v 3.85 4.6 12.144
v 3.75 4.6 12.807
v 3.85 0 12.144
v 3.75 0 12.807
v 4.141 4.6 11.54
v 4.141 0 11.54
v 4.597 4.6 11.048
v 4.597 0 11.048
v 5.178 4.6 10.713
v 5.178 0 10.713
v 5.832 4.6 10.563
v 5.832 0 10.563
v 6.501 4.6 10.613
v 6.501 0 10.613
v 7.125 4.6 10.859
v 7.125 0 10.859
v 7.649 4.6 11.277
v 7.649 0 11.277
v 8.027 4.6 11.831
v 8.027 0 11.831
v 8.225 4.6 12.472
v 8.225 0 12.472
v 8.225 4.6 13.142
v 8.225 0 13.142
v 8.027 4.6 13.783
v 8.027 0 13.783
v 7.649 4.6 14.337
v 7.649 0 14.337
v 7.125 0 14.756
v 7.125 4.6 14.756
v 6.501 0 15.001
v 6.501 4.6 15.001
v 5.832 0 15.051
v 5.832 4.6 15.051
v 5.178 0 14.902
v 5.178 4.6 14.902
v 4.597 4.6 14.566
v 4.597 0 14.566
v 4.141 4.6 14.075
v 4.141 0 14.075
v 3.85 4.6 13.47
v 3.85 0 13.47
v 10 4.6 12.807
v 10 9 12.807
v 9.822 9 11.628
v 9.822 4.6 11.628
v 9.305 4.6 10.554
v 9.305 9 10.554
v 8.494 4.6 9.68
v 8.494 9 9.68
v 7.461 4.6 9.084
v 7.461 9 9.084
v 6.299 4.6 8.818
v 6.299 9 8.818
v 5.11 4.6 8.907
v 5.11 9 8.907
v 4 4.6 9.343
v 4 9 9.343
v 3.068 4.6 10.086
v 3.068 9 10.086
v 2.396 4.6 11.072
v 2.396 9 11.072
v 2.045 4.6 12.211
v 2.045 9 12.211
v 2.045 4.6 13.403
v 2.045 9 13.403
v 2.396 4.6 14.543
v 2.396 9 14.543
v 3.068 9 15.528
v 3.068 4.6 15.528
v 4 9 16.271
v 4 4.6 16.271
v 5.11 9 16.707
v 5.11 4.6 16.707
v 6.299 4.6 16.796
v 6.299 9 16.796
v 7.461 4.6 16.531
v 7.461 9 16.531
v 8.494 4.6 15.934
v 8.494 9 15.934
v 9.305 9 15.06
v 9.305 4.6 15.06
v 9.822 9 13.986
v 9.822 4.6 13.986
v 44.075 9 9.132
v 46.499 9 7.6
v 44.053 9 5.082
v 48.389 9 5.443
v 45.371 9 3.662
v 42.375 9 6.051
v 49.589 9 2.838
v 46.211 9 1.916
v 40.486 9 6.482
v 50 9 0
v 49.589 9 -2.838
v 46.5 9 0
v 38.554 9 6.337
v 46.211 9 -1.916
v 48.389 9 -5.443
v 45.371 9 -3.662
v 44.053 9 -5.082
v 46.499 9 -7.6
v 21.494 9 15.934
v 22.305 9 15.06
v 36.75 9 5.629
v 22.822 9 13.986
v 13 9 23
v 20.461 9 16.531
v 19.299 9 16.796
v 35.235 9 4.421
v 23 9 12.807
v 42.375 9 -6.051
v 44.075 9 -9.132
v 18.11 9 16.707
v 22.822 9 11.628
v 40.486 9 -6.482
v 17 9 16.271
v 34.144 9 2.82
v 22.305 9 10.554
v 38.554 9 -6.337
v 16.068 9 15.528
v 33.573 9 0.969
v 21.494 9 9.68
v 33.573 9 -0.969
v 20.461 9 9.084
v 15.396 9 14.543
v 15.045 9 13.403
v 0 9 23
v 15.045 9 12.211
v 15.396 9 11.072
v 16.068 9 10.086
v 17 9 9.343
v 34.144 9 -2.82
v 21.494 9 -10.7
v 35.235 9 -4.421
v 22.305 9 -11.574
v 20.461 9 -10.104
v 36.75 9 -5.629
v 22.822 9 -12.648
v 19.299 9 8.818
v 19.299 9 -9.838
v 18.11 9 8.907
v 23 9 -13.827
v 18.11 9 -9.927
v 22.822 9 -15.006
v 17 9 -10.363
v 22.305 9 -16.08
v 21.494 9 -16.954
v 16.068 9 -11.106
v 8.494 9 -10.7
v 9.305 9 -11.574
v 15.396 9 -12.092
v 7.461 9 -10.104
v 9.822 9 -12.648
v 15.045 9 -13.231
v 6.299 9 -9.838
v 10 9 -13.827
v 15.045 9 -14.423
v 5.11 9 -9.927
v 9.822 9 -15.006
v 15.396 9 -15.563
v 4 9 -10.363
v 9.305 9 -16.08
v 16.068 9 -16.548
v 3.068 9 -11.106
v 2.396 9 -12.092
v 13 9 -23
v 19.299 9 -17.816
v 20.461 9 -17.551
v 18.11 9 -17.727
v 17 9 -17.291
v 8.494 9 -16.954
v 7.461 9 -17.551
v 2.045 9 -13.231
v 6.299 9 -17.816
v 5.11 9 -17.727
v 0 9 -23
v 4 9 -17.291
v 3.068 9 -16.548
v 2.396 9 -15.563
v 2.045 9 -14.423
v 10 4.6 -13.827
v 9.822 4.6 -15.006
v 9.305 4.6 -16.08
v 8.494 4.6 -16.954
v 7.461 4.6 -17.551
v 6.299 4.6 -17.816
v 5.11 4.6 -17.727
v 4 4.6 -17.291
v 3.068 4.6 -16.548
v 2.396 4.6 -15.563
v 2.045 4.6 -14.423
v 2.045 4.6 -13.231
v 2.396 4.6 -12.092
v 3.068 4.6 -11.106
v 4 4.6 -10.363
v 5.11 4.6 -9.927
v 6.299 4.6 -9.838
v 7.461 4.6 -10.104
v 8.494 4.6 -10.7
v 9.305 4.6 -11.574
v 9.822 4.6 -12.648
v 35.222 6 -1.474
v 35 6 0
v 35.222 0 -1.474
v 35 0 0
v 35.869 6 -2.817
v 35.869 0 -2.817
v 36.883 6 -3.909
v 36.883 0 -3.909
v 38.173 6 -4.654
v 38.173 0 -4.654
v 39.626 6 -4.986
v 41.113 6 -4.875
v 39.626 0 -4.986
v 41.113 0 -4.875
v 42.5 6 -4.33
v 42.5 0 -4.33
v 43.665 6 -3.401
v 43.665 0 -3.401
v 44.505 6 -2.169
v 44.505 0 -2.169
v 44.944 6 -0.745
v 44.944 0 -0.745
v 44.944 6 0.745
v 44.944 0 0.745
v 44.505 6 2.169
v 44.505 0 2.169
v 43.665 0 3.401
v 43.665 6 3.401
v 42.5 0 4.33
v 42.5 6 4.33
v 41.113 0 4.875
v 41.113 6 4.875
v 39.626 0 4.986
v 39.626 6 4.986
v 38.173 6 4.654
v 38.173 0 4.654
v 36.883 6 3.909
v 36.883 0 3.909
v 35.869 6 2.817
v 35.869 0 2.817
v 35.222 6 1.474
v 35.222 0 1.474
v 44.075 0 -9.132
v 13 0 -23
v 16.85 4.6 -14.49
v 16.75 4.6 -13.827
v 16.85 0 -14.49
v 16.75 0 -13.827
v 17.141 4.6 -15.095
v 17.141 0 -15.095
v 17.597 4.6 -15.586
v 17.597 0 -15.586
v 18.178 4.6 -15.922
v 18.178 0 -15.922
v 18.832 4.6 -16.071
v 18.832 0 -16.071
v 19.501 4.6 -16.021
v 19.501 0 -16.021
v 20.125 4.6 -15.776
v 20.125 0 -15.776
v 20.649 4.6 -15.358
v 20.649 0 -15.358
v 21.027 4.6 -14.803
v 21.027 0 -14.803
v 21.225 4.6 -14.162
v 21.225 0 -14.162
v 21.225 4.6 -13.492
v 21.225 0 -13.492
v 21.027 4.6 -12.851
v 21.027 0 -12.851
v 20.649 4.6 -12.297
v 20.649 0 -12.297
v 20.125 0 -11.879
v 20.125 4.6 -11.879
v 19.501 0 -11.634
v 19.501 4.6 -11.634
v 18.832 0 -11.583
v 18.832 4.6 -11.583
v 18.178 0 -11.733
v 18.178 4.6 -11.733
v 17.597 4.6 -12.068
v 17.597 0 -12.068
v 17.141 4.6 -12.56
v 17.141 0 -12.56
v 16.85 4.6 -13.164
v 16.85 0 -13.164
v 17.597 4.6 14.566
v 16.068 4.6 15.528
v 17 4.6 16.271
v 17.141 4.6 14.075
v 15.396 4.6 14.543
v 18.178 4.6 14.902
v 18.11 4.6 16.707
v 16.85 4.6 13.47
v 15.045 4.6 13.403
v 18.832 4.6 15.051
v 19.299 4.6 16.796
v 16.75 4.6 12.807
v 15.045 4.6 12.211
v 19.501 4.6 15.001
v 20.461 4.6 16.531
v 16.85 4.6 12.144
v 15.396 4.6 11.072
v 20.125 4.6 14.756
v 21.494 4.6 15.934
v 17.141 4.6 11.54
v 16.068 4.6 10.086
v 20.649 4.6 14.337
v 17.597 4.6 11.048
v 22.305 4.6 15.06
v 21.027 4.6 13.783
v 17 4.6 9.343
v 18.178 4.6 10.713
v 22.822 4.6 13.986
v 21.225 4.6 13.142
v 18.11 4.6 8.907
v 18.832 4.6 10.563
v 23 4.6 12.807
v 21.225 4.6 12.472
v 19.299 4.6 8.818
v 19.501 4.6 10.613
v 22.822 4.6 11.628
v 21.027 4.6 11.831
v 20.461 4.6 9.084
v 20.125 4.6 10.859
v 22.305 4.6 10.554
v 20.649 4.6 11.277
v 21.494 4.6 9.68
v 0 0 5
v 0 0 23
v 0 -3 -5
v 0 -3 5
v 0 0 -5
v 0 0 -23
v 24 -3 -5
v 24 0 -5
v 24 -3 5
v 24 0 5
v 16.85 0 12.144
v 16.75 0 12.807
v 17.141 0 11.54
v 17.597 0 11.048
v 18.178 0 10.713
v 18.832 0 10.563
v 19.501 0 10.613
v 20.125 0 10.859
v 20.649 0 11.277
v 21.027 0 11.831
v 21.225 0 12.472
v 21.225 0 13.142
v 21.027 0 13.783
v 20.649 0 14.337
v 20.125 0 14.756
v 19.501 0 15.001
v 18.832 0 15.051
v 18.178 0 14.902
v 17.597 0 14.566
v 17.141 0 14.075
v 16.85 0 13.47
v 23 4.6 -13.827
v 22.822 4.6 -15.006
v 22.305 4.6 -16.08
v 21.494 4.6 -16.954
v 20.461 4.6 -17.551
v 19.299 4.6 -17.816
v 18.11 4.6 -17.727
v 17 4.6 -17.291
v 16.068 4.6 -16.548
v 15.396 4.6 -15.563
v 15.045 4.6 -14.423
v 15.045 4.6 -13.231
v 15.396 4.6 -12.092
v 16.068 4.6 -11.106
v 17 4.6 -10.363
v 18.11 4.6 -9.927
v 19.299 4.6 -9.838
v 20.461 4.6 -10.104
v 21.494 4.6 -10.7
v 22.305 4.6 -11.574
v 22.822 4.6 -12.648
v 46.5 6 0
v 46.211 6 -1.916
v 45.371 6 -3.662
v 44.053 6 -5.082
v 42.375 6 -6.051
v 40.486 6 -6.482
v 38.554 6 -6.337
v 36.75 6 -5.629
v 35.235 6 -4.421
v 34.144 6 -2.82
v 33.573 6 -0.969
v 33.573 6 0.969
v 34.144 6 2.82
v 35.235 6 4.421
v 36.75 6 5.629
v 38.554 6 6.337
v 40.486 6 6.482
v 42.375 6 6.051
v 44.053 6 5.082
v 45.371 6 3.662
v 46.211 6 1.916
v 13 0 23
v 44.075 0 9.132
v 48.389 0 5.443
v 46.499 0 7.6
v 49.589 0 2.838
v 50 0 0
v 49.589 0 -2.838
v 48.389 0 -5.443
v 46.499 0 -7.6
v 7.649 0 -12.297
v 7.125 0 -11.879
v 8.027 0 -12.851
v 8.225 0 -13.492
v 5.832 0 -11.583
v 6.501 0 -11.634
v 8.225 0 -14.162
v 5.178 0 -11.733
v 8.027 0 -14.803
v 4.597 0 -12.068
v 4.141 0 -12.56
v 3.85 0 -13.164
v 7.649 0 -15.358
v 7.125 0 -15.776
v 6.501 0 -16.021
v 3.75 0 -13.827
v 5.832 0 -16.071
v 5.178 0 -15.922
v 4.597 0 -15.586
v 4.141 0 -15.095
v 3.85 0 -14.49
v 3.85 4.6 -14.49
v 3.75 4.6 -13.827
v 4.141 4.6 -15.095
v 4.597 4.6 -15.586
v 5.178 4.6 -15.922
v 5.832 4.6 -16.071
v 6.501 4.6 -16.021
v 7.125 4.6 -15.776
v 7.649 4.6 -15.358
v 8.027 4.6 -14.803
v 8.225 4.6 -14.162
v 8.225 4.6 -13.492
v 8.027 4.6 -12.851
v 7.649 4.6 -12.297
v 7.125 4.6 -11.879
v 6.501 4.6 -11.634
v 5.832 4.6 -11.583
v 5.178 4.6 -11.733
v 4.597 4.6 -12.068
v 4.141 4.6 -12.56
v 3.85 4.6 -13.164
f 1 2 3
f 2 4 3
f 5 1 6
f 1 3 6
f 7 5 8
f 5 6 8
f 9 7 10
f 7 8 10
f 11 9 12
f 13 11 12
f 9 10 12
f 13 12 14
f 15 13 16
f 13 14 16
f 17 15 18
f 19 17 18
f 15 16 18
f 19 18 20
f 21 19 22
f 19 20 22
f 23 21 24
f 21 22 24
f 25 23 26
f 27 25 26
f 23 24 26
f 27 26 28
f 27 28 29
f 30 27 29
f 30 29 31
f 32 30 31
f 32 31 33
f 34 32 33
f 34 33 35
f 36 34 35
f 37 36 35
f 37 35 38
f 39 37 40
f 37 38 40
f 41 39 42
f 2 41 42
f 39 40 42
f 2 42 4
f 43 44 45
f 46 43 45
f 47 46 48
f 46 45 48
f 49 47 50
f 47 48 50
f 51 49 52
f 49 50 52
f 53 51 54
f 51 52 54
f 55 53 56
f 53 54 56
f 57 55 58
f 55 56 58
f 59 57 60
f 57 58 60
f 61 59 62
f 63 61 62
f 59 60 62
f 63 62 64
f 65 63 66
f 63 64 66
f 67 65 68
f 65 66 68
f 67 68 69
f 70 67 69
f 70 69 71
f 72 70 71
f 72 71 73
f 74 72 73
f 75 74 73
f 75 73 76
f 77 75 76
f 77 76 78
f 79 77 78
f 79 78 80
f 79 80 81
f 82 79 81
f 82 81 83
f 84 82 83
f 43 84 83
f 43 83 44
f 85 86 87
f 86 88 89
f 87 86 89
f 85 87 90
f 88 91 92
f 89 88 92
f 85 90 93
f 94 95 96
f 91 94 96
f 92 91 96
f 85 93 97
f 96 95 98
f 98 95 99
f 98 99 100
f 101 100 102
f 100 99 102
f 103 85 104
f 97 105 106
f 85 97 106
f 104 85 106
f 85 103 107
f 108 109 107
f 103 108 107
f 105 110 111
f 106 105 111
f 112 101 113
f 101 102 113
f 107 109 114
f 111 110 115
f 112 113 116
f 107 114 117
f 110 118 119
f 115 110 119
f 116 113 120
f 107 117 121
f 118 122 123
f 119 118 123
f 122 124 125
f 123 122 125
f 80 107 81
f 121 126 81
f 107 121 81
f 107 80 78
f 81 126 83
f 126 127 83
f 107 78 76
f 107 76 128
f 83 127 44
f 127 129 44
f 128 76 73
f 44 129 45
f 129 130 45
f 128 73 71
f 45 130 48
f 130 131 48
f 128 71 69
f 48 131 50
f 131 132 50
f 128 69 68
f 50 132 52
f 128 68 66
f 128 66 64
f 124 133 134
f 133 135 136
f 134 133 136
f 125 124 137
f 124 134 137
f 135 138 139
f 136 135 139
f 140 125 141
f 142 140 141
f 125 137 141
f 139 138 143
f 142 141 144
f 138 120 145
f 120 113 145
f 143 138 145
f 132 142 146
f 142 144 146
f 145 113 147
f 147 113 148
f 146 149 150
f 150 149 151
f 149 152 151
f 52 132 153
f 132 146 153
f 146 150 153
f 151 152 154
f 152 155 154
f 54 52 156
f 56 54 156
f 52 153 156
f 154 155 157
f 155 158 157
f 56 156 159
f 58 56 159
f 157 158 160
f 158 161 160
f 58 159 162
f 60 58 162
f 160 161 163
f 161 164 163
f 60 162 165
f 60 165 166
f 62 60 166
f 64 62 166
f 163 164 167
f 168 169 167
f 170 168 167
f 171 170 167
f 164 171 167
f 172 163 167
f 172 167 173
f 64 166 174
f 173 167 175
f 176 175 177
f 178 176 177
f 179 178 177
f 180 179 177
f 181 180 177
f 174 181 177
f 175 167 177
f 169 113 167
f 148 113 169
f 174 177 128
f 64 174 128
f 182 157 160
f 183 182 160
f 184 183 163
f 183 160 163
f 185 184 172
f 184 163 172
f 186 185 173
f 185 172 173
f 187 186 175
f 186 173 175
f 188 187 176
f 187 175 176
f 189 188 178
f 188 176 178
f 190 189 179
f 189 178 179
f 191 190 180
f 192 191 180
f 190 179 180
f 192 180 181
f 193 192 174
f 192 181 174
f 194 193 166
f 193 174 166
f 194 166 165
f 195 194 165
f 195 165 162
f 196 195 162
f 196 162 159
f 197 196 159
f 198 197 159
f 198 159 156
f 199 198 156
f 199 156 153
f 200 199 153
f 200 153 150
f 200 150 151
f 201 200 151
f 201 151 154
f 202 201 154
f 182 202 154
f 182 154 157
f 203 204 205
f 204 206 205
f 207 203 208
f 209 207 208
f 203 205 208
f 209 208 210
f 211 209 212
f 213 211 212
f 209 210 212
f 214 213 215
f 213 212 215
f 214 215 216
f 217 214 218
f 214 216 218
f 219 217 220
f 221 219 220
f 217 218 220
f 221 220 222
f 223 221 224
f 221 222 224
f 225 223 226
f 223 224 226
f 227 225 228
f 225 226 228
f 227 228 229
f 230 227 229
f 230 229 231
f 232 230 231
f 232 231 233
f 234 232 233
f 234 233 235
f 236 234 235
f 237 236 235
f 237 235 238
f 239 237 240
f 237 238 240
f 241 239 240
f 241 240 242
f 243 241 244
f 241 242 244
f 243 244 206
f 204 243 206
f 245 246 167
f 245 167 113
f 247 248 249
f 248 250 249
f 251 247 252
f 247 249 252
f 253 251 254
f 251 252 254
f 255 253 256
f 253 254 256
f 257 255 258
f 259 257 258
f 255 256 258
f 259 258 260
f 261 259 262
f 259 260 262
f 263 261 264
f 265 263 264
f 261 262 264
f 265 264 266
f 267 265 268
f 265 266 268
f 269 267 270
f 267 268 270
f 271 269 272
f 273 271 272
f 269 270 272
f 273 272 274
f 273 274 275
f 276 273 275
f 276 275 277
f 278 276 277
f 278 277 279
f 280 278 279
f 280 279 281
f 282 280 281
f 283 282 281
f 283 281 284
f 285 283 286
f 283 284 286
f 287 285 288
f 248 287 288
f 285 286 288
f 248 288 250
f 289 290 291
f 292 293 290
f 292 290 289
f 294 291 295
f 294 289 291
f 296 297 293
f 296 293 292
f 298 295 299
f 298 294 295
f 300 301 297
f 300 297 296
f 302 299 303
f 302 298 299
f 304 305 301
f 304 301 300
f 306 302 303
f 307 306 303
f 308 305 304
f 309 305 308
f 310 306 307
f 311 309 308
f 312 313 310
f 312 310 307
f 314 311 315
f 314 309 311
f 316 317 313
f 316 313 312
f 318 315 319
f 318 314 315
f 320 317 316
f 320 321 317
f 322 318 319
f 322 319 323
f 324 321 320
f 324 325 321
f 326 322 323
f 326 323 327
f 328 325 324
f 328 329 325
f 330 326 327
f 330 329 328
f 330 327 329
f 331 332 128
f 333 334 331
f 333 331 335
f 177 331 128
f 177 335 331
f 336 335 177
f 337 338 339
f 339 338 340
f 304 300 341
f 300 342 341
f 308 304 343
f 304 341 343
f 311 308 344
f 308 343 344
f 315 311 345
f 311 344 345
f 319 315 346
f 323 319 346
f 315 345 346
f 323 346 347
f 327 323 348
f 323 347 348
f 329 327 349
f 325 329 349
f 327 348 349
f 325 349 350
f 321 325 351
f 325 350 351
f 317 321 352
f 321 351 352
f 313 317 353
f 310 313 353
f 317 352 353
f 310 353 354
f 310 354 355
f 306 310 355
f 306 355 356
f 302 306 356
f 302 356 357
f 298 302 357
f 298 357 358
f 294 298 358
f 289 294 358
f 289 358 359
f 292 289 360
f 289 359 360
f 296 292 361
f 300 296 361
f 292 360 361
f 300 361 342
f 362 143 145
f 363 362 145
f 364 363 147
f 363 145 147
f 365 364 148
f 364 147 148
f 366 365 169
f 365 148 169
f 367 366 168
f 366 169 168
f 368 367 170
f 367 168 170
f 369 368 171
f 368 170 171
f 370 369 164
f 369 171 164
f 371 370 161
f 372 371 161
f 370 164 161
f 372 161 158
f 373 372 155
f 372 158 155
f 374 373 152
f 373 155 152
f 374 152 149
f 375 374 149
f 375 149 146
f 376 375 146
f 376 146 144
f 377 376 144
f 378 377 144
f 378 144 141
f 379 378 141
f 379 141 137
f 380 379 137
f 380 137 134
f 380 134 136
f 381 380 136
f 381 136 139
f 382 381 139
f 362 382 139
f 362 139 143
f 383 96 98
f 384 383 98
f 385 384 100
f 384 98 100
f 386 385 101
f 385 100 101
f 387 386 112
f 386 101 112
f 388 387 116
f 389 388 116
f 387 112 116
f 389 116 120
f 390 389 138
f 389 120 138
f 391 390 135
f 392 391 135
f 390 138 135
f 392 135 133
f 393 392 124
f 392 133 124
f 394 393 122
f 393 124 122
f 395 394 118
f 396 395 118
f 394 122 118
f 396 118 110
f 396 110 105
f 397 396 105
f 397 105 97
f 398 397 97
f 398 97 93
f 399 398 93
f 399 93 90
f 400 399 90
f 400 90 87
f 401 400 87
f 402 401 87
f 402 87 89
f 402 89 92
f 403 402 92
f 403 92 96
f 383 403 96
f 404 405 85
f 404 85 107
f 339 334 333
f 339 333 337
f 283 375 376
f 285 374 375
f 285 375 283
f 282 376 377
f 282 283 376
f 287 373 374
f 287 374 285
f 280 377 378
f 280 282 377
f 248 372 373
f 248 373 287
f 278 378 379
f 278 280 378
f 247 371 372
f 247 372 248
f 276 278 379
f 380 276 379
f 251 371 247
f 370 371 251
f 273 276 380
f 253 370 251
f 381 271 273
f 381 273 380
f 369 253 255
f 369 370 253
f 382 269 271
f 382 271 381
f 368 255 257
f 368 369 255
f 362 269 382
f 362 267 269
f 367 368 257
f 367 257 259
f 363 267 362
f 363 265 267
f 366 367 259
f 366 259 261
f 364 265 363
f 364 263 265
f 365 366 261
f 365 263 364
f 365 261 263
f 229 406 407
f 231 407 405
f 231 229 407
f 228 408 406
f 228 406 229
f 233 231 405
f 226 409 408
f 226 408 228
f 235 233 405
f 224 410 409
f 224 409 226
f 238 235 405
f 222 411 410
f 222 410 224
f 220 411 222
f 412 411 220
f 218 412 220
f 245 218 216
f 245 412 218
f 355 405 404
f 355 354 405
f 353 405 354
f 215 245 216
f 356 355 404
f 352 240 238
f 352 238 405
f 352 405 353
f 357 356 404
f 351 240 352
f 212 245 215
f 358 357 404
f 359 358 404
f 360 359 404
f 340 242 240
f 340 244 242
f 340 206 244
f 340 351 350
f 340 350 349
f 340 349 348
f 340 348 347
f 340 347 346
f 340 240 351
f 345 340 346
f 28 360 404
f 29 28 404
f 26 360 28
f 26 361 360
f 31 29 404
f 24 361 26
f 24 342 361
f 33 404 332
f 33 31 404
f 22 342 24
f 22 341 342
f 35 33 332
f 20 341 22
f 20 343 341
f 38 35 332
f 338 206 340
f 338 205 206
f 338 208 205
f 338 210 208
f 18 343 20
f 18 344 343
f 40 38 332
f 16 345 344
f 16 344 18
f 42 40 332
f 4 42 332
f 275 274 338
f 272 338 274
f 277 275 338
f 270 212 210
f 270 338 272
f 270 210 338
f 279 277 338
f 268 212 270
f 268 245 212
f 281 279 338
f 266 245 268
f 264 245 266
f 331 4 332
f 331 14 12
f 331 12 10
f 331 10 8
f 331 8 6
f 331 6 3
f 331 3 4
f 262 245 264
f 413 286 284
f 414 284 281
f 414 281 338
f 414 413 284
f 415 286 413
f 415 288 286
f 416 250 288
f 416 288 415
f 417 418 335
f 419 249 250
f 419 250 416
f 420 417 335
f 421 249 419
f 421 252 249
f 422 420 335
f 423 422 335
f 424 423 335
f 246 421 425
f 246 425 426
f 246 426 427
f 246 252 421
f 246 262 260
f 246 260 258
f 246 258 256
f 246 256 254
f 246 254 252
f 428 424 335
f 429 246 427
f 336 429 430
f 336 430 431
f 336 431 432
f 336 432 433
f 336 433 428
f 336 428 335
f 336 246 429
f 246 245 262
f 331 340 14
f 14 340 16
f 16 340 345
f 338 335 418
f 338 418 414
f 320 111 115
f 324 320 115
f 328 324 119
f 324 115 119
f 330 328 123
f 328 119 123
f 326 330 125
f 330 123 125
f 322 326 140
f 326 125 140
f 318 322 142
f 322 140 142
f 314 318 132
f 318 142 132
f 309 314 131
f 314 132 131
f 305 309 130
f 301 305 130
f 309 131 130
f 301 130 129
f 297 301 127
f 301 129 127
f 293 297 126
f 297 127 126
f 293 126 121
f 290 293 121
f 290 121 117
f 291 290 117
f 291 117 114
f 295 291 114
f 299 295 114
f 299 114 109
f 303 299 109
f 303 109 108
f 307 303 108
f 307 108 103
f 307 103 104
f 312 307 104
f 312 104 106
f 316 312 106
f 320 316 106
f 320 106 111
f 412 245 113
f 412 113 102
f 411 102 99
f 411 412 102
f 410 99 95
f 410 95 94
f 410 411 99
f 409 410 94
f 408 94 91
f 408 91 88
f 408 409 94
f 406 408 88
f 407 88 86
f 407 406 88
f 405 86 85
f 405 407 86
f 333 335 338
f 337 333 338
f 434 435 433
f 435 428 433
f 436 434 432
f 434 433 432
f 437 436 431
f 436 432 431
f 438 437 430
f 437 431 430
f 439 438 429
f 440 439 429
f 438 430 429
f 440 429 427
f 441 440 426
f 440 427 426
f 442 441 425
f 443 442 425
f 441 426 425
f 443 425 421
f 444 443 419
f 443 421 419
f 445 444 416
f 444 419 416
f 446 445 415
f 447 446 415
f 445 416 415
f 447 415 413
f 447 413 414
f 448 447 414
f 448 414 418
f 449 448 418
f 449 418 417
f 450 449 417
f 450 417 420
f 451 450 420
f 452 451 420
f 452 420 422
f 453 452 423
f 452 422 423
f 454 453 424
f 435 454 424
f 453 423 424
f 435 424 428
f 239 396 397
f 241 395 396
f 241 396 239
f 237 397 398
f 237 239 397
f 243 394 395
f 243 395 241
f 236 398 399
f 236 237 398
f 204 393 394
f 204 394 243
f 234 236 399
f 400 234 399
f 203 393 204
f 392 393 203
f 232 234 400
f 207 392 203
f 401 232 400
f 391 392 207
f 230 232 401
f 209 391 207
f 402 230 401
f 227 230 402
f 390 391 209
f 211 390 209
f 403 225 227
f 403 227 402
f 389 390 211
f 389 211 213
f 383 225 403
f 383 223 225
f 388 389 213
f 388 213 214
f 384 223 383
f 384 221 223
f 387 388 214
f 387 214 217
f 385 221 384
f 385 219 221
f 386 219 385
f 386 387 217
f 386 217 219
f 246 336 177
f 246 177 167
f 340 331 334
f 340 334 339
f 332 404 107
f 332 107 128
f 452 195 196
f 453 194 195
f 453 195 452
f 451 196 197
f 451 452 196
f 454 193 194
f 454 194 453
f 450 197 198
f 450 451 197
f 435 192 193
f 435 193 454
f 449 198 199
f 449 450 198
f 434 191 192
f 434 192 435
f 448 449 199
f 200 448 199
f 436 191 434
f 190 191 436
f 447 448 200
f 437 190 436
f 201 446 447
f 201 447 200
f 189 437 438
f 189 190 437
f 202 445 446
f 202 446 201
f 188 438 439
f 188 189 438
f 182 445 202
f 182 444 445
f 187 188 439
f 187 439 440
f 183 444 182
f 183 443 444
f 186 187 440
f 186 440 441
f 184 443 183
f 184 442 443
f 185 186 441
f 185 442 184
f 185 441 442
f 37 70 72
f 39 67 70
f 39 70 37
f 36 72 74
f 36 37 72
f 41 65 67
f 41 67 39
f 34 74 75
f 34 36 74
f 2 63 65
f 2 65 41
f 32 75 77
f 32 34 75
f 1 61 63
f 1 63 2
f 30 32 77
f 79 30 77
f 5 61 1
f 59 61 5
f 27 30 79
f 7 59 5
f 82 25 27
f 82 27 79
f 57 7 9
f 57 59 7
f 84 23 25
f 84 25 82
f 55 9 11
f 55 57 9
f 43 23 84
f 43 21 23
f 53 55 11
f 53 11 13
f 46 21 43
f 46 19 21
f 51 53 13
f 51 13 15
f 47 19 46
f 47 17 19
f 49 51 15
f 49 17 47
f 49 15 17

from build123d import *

# Parameters (mm, degrees)
EXTRUDE_1_DEPTH              = 9
SKETCH_2_W                   = 24
SKETCH_2_H                   = 10
EXTRUDE_2_DEPTH              = 3
HOLE_WIZARD_M4_1_D           = 4.5
HOLE_WIZARD_M4_1_DEPTH       = 9
HOLE_WIZARD_M4_1_CBORE_D     = 8
HOLE_WIZARD_M4_1_CBORE_DEPTH = 4.4
HOLE_WIZARD_M4_1_TIP         = 1.351936393
HOLE_WIZARD_M4_2_D           = 10
HOLE_WIZARD_M4_2_CBORE_D     = 13
HOLE_WIZARD_M4_2_CBORE_DEPTH = 3


with BuildPart() as part:
    # 스케치1 → 보스-돌출1 (new body)
    with BuildSketch(Plane(origin=(0, 0, 0), x_dir=(1, 0, 0), z_dir=(0, 1, 0))):
        with BuildLine():
            Line((0, 0), (0, 23))
            Line((0, 23), (13, 23))
            Line((13, 23), (44.075327331, 9.131905997))
            ThreePointArc((44.075327331, 9.131905997), (50, 0), (44.075327331, -9.131905997))
            Line((44.075327331, -9.131905997), (13, -23))
            Line((13, -23), (0, -23))
            Line((0, -23), (0, 0))
        make_face()
    extrude(amount=EXTRUDE_1_DEPTH)

    # 스케치2 → 보스-돌출2 (add)
    with BuildSketch(Plane.XZ):
        with Locations((12, 0)):
            Rectangle(SKETCH_2_W, SKETCH_2_H)
    extrude(amount=EXTRUDE_2_DEPTH)

    # M4 소켓 머리 캡 나사용 카운터보어1
    with Locations(Plane(origin=(0, 9, 0), x_dir=(1, 0, 0), z_dir=(0, 1, 0))):
        with Locations((6, 13.827116768), (19, 13.827116768), (6, -12.807083564), (19, -12.807083564)):
            CounterBoreHole(HOLE_WIZARD_M4_1_D / 2, HOLE_WIZARD_M4_1_CBORE_D / 2, HOLE_WIZARD_M4_1_CBORE_DEPTH, depth=HOLE_WIZARD_M4_1_DEPTH)
            with Locations((0, 0, -(HOLE_WIZARD_M4_1_DEPTH + HOLE_WIZARD_M4_1_TIP / 2))):  # 118° drill point
                Cone(0, HOLE_WIZARD_M4_1_D / 2, HOLE_WIZARD_M4_1_TIP, mode=Mode.SUBTRACT)

    # M4 소켓 머리 캡 나사용 카운터보어2 (through all)
    with Locations(Plane(origin=(0, 9, 0), x_dir=(1, 0, 0), z_dir=(0, 1, 0))):
        with Locations((40, 0)):
            CounterBoreHole(HOLE_WIZARD_M4_2_D / 2, HOLE_WIZARD_M4_2_CBORE_D / 2, HOLE_WIZARD_M4_2_CBORE_DEPTH)


solid = part.part
